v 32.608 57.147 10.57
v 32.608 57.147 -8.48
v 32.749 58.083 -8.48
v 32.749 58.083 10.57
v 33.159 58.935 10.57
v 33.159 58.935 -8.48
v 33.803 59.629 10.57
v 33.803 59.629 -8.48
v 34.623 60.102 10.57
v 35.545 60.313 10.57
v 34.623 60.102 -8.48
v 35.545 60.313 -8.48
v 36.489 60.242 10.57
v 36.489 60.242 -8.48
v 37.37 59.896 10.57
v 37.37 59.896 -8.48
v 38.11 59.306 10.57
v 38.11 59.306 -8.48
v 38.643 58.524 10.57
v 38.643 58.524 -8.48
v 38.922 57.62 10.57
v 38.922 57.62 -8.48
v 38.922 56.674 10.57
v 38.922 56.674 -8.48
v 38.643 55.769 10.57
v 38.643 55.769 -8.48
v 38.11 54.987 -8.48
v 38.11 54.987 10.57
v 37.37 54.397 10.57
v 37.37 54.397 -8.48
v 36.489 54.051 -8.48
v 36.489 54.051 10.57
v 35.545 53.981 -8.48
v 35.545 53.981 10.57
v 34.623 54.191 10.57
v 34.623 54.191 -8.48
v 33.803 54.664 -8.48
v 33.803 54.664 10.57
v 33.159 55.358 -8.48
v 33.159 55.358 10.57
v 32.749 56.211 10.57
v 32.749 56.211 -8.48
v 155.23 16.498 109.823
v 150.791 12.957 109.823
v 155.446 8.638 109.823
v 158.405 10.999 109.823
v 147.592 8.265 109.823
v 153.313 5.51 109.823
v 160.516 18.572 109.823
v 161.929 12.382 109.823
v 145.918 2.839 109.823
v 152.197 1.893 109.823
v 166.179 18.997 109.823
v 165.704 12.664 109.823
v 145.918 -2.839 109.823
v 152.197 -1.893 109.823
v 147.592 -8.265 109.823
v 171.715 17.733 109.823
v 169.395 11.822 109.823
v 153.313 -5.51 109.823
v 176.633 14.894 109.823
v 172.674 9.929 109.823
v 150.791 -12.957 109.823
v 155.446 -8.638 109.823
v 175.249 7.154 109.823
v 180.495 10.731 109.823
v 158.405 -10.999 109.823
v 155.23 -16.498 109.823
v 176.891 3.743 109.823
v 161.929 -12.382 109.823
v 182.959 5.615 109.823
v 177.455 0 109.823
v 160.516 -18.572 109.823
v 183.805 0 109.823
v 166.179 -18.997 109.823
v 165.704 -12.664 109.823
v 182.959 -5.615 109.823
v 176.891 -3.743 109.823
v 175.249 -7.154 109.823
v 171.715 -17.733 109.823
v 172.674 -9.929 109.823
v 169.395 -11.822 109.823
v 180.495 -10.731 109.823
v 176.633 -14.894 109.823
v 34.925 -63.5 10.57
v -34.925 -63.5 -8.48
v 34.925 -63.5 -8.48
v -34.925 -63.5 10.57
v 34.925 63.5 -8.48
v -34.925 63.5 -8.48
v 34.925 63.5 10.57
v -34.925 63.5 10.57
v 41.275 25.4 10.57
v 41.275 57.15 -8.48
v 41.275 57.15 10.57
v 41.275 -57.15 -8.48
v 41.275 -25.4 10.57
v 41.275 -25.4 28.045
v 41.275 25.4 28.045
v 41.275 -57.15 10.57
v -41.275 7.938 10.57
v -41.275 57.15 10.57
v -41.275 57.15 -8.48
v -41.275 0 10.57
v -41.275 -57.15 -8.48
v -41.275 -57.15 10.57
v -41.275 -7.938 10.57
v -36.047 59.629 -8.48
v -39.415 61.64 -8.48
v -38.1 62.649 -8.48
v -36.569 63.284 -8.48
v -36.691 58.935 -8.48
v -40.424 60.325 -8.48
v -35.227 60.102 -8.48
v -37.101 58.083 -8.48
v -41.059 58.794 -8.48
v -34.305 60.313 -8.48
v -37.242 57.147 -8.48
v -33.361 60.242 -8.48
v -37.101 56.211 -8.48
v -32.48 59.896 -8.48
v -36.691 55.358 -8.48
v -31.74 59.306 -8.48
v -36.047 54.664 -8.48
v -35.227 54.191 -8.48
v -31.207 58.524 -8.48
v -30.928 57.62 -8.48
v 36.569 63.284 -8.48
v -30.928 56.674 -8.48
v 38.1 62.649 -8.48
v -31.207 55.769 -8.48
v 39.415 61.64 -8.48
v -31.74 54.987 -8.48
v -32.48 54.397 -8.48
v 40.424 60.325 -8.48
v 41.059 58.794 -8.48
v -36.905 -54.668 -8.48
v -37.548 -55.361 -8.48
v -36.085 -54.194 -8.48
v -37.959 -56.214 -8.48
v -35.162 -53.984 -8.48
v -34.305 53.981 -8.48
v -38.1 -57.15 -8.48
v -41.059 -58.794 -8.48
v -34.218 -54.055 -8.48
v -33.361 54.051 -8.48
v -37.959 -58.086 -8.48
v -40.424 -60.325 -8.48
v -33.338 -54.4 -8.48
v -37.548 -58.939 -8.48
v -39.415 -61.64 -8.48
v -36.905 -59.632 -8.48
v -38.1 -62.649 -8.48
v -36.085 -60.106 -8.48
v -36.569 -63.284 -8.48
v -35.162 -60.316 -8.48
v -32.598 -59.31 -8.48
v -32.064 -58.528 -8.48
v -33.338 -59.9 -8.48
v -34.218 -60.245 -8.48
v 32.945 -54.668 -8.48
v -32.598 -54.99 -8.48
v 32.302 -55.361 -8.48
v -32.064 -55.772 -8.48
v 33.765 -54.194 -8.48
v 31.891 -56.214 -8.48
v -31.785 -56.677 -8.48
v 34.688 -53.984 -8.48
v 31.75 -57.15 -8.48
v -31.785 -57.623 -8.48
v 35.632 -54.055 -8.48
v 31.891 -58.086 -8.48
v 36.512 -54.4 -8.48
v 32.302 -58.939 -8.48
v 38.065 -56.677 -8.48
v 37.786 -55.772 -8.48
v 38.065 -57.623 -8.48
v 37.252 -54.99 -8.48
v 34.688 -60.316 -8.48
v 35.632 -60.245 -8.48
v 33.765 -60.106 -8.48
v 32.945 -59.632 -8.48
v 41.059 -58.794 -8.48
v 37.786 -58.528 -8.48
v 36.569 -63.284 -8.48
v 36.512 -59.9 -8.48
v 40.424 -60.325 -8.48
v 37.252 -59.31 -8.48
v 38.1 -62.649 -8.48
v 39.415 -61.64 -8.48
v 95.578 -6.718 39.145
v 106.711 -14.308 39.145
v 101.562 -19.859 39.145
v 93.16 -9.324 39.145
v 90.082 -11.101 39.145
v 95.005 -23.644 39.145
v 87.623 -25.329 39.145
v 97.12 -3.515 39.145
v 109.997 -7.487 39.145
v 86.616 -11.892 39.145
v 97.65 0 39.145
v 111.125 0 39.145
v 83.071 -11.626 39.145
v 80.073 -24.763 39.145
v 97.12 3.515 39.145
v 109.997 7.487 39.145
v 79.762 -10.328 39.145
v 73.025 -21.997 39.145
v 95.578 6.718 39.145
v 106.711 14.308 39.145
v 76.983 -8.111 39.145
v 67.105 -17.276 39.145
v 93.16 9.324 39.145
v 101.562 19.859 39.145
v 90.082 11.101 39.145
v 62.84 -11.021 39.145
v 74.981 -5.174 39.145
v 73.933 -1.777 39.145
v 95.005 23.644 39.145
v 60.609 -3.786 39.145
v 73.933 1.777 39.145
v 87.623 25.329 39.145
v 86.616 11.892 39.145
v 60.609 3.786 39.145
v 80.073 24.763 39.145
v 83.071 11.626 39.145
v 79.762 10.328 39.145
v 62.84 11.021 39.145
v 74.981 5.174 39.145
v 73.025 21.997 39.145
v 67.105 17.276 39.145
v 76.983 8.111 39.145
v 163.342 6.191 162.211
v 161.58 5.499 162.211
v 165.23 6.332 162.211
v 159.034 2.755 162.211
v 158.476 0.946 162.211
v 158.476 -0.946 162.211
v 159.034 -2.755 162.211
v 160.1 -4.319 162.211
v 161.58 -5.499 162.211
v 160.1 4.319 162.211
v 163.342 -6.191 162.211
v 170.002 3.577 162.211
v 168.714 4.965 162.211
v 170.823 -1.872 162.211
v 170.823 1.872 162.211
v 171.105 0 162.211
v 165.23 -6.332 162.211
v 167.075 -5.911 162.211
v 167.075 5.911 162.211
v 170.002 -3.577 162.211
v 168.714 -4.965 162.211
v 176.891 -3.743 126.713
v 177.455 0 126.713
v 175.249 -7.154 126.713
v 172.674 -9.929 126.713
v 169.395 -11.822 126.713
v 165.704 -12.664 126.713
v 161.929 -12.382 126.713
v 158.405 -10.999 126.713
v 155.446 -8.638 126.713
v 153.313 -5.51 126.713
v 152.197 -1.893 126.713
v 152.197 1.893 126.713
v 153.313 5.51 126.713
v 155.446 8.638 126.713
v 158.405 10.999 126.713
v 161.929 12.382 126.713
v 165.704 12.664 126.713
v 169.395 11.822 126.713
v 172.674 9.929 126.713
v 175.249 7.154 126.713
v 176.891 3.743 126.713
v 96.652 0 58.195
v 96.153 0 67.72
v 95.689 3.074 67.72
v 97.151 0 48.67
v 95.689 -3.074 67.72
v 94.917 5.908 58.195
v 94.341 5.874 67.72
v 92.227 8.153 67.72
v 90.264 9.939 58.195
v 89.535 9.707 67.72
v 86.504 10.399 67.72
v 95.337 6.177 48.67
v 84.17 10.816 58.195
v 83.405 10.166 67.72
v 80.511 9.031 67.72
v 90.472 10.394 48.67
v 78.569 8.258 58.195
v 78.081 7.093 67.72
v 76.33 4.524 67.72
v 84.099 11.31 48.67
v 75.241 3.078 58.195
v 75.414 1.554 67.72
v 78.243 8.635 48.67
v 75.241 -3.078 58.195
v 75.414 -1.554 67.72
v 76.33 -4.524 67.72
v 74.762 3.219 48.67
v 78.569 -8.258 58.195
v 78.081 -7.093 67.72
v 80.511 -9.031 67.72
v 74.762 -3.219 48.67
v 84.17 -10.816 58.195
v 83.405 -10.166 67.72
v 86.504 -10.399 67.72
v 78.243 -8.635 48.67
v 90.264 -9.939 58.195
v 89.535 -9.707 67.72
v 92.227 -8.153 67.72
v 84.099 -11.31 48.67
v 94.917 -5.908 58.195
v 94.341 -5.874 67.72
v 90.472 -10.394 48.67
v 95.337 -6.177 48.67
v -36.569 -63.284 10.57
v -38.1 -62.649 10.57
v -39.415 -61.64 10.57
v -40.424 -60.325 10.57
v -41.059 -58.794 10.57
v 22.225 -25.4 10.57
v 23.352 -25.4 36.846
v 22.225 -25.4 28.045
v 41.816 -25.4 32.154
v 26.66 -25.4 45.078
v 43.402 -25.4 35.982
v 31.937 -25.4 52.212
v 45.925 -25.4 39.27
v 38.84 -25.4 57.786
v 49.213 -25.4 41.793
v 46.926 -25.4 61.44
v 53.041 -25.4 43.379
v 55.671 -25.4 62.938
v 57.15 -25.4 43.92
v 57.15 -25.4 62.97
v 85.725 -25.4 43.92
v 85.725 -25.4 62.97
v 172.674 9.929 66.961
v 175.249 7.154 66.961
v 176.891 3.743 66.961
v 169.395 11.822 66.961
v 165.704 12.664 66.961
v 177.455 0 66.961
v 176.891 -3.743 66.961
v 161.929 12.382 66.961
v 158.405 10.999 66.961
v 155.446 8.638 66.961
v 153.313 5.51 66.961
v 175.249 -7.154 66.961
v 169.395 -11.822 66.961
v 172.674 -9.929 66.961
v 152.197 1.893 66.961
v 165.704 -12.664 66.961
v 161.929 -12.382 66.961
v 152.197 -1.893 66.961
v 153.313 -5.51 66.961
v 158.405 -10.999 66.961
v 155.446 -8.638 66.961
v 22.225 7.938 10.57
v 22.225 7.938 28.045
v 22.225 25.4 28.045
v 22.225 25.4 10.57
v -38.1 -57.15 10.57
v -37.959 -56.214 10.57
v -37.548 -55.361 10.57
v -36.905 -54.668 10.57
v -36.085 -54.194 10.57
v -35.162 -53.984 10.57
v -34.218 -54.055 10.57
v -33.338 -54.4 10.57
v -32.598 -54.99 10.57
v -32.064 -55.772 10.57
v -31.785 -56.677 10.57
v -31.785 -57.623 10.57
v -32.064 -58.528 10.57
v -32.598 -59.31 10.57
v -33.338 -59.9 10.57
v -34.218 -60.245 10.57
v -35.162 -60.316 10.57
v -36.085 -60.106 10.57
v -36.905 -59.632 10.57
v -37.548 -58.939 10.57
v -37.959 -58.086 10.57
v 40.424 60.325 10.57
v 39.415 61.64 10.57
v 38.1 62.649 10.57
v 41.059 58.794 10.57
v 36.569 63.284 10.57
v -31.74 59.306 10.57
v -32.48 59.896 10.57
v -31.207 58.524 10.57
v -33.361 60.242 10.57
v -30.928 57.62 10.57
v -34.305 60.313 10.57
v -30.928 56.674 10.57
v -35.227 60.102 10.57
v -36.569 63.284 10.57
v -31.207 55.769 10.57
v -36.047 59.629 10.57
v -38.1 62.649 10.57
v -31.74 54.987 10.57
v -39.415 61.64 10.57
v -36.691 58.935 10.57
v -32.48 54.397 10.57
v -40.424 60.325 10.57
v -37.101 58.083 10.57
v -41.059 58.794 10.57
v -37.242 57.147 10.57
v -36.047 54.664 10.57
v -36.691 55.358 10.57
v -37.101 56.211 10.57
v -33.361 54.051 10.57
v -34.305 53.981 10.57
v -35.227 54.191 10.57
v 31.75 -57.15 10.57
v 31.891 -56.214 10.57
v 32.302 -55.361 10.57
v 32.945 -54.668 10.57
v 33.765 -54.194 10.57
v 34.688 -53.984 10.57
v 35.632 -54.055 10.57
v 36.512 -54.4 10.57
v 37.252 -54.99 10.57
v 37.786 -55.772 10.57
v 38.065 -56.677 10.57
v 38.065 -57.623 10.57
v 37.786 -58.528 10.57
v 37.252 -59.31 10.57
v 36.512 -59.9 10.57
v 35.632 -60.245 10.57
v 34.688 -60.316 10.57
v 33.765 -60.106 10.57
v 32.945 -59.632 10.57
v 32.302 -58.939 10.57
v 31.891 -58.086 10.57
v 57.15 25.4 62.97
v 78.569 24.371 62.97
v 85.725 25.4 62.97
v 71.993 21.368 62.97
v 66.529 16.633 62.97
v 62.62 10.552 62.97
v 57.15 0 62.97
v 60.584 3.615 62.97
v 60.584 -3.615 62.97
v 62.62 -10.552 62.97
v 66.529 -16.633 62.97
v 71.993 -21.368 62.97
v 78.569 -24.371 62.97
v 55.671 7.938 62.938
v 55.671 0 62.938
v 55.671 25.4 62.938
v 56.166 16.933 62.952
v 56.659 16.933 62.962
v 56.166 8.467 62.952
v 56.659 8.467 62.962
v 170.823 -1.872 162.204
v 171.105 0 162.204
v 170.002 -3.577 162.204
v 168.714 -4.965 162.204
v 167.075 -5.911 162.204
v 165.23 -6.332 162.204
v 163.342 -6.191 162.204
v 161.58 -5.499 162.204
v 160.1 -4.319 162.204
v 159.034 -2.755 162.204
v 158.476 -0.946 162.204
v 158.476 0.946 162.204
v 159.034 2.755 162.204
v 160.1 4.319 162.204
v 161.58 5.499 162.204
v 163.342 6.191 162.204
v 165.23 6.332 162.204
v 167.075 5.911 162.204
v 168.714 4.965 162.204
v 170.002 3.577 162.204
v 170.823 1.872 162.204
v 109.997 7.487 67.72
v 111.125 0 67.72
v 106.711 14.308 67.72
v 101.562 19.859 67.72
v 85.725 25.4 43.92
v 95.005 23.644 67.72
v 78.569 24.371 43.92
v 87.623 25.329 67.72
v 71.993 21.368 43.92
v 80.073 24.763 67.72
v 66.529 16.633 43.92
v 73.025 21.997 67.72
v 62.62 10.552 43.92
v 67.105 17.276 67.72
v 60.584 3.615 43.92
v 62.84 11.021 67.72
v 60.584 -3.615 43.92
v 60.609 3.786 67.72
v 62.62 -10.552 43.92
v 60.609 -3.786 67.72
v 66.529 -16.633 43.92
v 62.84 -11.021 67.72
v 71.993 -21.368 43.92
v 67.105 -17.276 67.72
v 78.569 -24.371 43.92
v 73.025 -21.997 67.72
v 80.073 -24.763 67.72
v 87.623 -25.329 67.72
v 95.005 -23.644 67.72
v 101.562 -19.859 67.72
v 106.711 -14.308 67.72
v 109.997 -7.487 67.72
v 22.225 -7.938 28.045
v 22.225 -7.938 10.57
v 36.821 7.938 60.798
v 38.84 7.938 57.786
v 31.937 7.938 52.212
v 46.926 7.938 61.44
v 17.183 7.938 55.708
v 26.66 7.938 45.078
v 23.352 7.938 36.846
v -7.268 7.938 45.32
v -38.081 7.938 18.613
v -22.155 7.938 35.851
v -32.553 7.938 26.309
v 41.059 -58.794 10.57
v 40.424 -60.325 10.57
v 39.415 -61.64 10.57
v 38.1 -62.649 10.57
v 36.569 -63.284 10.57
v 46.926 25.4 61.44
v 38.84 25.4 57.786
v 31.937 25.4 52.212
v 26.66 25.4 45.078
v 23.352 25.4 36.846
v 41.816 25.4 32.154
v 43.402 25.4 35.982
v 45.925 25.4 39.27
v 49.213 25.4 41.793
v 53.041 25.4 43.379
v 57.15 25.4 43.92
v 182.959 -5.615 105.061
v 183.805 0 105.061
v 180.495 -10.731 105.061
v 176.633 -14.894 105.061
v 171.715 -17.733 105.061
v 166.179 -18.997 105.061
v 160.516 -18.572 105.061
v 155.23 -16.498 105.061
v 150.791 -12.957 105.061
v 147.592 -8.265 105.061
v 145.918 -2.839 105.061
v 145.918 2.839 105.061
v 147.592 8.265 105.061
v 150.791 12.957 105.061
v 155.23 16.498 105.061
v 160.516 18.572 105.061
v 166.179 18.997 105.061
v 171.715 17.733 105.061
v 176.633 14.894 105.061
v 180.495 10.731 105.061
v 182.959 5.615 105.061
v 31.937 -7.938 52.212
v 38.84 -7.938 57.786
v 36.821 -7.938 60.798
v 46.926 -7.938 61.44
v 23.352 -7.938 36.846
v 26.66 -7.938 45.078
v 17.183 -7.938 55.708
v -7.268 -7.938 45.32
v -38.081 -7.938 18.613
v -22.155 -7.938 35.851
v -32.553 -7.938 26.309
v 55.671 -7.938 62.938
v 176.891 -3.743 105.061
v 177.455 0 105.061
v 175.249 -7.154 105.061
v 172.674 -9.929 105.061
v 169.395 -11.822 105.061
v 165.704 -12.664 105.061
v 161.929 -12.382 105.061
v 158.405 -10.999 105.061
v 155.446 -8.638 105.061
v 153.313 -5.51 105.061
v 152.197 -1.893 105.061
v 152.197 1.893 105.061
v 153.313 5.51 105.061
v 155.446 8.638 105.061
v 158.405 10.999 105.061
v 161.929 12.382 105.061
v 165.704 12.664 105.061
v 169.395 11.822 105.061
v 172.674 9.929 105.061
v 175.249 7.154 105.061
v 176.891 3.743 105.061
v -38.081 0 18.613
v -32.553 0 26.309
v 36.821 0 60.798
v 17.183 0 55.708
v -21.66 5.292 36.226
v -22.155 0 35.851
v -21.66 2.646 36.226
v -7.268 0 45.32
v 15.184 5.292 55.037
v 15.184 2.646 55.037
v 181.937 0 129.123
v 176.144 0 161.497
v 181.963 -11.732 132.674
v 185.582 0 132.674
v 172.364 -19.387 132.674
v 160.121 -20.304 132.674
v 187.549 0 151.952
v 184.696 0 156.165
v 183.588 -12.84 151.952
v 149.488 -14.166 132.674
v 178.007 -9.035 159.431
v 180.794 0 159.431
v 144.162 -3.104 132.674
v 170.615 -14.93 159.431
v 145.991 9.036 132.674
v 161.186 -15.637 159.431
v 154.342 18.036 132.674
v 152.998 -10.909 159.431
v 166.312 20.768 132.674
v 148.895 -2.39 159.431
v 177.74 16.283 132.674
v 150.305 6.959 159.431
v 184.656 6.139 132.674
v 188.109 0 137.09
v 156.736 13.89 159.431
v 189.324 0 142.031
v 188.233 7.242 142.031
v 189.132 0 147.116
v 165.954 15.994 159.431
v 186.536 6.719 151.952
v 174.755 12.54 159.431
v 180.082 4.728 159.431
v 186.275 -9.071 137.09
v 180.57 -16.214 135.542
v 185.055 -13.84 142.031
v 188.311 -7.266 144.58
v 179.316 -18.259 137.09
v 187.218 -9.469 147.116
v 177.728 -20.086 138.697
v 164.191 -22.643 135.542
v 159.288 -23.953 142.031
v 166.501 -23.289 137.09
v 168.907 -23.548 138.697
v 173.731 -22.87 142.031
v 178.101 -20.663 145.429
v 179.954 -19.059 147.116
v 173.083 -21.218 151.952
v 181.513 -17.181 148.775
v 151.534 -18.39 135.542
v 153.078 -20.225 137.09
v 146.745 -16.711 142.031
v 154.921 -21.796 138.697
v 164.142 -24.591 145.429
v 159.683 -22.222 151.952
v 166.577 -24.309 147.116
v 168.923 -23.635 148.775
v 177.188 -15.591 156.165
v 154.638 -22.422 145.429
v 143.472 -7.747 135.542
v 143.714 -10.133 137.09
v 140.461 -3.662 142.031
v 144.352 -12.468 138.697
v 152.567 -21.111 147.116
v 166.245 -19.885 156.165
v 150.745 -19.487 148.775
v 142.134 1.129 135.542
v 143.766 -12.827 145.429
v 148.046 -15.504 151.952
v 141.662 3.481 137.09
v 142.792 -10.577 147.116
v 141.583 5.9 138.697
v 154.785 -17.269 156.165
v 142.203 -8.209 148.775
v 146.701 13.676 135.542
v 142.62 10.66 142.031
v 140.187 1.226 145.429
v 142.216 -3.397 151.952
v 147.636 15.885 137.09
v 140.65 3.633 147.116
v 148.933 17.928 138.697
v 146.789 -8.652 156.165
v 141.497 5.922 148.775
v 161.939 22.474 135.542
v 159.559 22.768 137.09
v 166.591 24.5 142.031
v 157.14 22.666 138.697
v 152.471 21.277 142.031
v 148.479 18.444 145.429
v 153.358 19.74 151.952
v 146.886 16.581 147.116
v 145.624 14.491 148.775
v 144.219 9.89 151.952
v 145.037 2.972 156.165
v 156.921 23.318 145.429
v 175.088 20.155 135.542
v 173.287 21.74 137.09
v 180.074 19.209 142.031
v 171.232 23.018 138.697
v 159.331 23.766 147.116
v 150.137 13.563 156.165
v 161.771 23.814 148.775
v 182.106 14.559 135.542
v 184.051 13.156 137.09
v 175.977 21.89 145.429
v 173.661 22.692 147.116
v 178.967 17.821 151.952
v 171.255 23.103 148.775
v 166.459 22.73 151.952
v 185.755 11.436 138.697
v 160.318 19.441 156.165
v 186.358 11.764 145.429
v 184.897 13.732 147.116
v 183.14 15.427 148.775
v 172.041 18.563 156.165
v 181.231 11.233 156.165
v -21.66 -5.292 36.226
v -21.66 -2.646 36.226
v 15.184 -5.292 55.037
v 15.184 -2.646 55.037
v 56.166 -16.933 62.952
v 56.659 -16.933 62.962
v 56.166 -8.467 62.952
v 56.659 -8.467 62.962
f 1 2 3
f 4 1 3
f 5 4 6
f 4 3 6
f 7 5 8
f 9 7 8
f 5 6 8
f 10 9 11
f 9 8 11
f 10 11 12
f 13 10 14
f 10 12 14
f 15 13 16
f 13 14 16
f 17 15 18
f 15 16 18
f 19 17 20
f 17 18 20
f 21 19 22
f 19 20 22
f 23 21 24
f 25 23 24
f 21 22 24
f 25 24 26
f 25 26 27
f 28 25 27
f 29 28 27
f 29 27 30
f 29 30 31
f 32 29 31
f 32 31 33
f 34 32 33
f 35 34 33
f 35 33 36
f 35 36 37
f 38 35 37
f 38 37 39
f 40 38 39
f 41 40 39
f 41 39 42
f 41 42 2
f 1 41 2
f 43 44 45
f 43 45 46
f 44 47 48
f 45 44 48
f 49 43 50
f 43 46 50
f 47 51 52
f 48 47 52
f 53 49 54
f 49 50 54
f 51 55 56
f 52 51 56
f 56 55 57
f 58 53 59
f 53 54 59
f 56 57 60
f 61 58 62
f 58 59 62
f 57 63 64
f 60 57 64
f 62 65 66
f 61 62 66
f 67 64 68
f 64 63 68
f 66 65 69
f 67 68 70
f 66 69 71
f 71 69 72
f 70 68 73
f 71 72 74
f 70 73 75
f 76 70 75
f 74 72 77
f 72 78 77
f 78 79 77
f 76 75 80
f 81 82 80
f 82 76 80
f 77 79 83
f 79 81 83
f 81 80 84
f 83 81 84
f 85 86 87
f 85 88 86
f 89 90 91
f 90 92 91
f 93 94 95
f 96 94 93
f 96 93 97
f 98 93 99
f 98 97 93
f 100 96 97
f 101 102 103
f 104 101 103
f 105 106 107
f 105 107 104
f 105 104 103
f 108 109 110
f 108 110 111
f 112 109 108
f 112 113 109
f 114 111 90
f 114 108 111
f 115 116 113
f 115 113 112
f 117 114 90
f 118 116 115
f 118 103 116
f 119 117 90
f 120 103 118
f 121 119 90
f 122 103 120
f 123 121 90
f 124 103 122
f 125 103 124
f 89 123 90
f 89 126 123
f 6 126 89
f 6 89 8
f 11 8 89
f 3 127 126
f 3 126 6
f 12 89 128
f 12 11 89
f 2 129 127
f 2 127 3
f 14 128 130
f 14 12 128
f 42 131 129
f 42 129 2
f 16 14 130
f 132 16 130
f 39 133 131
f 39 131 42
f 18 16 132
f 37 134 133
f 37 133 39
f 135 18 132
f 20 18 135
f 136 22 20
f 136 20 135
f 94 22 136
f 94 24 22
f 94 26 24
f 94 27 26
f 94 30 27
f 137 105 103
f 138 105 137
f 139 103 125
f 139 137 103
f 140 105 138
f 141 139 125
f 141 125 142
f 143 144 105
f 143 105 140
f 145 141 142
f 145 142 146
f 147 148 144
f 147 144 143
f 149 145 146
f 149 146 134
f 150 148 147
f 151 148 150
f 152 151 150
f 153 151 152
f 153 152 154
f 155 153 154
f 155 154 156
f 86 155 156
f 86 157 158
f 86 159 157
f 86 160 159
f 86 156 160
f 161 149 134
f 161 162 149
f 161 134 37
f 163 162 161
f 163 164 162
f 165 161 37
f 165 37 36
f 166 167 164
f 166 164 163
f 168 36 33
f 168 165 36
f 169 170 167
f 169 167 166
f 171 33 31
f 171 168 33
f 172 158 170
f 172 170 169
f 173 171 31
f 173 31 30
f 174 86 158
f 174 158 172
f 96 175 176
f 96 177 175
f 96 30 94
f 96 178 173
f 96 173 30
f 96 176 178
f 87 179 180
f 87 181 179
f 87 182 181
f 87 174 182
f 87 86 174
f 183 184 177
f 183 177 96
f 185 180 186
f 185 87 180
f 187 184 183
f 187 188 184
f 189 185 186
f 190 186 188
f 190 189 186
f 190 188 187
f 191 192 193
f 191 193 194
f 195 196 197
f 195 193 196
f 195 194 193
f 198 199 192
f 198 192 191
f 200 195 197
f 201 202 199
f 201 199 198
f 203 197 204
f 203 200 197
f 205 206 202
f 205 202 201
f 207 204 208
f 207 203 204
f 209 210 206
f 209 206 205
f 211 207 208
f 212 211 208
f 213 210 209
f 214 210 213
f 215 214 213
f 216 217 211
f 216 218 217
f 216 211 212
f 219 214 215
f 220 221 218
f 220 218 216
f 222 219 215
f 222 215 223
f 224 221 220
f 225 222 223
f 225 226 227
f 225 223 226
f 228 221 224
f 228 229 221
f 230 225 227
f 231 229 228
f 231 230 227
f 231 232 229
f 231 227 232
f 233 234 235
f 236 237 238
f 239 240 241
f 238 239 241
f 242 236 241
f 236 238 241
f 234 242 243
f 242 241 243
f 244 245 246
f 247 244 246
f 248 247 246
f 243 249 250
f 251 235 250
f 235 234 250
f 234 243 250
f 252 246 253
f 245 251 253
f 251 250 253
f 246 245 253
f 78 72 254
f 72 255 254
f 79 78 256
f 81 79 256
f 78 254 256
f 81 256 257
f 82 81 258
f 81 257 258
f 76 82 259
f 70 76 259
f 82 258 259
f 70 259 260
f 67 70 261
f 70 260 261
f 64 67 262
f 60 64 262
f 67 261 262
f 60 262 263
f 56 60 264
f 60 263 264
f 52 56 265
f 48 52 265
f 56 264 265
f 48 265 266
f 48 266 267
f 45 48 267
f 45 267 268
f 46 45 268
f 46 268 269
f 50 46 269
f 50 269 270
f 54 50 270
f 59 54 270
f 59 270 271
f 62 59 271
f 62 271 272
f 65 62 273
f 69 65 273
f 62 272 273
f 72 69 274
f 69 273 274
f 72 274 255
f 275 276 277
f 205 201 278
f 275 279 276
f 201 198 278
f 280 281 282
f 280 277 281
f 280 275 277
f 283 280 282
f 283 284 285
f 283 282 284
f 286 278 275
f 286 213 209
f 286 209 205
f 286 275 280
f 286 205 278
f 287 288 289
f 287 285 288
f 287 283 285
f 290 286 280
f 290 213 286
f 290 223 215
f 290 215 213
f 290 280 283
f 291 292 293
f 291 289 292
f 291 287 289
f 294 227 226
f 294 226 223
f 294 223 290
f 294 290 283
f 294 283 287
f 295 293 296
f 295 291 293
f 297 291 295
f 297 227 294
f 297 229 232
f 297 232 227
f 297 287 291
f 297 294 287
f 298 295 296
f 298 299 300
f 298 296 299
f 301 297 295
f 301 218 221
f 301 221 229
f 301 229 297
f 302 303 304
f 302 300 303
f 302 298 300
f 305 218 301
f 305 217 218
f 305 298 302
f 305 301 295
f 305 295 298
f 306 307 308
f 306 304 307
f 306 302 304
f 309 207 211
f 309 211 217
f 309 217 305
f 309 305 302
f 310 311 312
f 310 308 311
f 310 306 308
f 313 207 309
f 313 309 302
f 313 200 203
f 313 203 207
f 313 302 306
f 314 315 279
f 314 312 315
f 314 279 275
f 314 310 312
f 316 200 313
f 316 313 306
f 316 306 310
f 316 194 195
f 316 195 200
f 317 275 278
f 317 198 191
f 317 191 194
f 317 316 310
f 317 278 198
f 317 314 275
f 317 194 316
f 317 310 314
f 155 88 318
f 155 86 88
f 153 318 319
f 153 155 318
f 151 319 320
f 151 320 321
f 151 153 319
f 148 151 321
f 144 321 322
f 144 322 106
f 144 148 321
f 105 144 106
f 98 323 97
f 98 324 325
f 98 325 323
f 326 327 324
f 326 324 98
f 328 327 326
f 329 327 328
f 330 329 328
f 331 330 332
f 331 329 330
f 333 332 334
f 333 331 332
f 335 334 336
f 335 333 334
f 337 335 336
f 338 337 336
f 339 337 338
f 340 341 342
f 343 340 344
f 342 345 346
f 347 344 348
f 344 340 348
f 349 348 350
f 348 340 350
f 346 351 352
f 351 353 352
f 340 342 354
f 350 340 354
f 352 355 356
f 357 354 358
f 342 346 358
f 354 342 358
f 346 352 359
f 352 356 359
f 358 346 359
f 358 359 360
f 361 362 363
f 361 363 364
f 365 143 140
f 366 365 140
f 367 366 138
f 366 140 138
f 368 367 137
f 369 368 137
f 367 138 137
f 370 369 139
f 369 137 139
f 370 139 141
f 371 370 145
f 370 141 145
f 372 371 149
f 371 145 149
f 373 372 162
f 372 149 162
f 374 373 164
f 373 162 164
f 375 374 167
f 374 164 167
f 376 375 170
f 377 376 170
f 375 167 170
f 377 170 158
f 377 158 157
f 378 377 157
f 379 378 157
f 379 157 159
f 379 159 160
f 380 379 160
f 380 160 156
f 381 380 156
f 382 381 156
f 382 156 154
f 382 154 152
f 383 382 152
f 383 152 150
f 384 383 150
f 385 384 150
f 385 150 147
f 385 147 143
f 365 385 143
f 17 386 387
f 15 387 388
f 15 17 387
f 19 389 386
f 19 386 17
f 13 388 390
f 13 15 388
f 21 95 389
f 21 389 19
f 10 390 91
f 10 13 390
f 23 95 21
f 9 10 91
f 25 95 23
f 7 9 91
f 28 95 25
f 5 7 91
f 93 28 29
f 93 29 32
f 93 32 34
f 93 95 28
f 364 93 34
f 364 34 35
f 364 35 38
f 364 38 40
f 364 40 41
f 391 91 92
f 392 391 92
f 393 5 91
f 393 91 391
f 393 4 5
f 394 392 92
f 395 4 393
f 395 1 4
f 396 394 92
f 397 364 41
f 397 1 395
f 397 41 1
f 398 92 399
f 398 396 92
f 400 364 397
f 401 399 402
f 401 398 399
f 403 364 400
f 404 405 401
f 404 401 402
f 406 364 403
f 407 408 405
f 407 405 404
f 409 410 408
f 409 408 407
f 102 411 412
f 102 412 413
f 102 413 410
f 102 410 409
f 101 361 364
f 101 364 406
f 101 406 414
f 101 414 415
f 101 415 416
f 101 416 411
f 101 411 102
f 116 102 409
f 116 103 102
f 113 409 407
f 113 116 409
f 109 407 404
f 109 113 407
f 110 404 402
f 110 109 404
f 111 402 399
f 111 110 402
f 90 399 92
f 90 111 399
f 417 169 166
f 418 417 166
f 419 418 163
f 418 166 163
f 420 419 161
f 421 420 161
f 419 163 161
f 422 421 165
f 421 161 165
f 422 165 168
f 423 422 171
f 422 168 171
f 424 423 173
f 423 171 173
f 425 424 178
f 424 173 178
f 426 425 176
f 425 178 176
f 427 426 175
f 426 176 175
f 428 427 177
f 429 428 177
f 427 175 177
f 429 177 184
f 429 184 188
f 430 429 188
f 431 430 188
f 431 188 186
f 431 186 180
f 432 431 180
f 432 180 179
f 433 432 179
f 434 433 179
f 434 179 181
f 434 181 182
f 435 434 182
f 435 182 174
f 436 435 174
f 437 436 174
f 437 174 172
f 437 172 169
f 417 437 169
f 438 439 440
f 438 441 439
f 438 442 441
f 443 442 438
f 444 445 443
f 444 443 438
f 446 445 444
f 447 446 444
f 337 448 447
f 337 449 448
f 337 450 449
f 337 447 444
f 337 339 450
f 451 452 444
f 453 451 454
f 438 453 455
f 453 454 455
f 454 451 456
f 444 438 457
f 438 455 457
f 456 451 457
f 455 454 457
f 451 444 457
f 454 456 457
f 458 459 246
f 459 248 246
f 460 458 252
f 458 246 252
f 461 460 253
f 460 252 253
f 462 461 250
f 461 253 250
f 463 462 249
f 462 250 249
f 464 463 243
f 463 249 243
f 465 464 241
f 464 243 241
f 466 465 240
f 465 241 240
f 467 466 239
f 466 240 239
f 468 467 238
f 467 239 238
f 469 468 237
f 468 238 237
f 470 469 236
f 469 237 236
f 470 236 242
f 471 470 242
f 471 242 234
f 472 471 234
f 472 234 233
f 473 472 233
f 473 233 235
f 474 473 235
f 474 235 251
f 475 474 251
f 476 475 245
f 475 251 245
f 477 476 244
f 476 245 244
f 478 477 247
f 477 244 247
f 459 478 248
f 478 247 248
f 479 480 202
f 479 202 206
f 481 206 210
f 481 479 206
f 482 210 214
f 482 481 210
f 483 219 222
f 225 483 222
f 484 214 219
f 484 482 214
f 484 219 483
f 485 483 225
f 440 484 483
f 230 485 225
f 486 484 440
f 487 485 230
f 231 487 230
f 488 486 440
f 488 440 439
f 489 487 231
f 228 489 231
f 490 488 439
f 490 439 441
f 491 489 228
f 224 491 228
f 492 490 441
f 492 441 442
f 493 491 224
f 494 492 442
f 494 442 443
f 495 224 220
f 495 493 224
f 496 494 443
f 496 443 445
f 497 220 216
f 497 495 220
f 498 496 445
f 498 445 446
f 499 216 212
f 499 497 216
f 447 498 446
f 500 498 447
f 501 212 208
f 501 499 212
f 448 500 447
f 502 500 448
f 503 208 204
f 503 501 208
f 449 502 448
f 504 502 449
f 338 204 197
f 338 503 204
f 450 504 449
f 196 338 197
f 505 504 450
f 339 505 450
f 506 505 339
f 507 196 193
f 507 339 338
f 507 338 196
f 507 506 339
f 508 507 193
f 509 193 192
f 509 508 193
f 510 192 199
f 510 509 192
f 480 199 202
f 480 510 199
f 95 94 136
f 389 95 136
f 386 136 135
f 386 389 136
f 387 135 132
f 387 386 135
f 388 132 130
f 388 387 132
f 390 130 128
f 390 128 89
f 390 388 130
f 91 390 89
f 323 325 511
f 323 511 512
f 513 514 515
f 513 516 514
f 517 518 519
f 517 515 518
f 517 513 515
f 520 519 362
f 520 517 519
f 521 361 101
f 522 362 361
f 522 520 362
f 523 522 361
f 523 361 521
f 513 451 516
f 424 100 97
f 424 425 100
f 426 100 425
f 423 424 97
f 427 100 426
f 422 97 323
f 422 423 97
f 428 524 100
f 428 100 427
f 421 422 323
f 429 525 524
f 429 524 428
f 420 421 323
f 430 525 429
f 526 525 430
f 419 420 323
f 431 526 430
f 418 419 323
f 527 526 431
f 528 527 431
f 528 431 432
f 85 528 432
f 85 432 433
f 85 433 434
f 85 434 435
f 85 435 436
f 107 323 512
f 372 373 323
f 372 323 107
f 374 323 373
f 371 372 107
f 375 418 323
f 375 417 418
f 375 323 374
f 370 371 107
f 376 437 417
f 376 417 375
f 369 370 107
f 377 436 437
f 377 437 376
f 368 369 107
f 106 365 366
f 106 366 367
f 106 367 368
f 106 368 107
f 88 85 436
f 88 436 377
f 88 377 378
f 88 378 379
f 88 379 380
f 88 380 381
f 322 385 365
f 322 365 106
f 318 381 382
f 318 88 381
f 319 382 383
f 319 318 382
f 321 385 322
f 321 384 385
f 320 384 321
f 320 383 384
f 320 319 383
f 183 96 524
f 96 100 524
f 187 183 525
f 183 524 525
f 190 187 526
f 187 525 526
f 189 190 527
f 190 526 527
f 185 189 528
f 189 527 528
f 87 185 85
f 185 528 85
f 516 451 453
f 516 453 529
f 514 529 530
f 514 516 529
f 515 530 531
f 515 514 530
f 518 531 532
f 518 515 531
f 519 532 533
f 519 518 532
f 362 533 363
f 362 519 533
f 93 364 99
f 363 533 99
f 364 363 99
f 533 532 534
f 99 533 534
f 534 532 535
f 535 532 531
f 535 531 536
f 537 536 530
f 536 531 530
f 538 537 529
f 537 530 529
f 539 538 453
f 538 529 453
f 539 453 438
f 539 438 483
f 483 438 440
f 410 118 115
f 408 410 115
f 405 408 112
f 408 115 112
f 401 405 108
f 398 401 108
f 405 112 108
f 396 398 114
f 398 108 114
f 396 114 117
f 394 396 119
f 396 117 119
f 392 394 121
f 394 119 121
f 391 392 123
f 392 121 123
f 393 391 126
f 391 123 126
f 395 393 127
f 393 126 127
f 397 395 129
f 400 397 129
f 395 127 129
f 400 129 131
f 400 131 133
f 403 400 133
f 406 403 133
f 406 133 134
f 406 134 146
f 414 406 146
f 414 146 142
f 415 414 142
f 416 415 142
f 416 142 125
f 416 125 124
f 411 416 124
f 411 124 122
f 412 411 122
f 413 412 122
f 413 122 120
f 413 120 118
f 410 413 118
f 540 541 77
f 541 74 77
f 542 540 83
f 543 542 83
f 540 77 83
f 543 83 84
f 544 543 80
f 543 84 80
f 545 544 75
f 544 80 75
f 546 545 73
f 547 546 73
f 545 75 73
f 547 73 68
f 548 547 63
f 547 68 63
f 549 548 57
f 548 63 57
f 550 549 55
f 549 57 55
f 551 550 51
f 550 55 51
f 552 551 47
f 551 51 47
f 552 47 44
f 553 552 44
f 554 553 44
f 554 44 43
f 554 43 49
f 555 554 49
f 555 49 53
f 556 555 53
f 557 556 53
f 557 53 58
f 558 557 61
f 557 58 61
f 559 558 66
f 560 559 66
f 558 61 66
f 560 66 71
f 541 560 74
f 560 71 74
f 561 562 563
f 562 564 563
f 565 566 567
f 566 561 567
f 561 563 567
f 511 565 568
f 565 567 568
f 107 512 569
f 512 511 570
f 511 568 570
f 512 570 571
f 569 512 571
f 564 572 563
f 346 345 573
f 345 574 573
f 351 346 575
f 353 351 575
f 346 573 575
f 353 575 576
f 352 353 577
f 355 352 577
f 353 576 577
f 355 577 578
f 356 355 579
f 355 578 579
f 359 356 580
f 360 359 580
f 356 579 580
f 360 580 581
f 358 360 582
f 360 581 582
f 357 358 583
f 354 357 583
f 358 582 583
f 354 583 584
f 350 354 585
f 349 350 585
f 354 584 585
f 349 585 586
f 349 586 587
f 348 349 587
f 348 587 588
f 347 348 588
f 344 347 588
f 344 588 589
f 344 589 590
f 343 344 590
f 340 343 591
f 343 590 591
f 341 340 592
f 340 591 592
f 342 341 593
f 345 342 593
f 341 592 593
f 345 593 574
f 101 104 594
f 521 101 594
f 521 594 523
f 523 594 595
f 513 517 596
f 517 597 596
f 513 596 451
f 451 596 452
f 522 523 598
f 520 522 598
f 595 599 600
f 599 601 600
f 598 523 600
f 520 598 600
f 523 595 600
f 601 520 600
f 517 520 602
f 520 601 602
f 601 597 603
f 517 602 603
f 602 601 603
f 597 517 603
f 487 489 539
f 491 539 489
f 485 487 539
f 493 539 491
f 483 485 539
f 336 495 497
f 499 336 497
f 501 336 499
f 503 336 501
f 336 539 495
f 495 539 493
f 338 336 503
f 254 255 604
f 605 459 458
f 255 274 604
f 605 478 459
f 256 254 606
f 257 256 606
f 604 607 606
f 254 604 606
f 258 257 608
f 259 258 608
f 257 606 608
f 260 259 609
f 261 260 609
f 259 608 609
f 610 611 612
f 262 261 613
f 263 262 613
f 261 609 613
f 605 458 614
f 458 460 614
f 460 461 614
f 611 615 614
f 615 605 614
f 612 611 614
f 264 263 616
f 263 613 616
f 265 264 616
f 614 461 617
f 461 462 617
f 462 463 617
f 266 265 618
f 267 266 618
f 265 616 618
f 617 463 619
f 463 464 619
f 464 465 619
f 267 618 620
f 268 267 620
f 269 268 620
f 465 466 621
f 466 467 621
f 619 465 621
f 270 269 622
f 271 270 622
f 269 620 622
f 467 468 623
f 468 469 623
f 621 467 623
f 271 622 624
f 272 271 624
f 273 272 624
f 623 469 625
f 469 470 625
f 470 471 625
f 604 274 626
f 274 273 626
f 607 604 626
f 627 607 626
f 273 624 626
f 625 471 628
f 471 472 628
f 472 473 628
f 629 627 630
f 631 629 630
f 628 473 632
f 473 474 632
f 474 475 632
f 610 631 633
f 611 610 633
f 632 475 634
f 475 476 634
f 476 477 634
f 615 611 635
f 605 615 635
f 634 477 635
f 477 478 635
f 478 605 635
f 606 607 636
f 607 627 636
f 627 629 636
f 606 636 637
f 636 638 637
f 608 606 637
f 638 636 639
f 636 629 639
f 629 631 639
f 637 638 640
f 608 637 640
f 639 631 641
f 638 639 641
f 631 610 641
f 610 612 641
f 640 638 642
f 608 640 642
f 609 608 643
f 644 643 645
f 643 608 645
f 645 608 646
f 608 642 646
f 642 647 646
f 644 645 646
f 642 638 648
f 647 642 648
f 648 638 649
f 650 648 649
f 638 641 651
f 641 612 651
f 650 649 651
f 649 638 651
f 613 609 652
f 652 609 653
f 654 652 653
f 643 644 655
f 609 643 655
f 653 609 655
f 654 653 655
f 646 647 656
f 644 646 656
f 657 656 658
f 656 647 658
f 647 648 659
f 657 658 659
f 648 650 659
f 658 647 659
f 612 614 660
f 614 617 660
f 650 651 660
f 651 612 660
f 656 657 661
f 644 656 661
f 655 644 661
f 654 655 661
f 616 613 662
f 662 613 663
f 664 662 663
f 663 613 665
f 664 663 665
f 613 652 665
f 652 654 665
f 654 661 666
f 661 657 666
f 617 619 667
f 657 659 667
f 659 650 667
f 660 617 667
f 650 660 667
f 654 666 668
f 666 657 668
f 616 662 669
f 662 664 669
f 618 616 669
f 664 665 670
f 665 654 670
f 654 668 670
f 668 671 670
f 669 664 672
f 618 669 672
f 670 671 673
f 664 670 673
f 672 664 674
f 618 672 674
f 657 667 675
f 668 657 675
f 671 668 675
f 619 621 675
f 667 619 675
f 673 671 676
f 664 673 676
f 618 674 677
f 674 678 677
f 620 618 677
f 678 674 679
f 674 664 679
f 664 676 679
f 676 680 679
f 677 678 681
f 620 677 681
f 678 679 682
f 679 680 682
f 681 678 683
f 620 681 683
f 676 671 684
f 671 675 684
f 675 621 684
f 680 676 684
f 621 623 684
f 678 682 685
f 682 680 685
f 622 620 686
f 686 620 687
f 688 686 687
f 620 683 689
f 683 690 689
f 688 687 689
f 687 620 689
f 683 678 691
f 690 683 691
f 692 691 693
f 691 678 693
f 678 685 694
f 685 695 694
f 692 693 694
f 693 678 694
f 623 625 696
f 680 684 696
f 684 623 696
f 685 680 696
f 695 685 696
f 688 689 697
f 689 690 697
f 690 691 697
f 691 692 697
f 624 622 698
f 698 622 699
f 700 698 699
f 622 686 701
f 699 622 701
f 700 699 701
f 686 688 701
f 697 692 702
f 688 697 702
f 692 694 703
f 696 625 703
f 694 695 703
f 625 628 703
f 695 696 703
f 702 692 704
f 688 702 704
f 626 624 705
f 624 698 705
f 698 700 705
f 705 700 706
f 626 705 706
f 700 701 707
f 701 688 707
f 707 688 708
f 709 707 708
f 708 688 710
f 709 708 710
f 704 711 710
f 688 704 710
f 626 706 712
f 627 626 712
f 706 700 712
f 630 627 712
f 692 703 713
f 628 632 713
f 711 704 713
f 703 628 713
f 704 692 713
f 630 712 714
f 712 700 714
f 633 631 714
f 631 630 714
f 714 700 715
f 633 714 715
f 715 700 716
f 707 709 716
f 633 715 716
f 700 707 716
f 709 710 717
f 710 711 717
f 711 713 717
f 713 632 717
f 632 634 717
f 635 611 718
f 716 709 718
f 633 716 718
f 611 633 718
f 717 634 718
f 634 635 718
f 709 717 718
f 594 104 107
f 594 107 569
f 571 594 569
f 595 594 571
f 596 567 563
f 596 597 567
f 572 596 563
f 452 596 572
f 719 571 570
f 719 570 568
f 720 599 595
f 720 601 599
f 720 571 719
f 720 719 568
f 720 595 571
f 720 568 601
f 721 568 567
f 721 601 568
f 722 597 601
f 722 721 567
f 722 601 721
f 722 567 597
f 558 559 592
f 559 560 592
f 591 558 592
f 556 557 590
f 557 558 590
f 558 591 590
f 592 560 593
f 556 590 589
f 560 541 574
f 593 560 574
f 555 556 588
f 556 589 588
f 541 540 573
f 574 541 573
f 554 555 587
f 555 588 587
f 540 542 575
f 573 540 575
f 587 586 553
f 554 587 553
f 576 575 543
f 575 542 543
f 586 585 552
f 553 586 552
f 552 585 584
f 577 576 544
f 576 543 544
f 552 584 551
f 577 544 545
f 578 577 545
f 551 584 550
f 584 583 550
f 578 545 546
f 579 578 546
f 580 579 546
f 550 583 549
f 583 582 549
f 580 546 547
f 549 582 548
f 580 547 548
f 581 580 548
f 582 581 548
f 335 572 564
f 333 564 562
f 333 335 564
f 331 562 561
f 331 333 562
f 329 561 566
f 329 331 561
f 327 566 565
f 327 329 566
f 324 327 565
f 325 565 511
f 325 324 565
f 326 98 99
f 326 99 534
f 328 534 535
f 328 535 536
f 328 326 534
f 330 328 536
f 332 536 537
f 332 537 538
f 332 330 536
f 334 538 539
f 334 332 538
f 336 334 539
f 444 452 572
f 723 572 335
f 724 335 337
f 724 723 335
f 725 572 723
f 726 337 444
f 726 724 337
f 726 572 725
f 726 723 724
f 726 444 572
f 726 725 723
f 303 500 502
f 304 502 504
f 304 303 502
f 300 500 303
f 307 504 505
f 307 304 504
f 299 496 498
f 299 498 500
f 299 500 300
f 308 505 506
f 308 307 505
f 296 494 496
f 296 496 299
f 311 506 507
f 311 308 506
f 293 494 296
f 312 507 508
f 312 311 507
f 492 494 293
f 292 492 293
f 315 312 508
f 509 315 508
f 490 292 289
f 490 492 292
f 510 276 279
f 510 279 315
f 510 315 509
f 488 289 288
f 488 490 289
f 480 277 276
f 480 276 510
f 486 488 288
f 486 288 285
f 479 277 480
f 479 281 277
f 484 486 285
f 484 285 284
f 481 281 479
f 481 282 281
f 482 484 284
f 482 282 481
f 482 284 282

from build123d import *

# Parameters (mm, degrees)
F1_DEPTH = 63.5
F0_W     = 25.4
F0_H     = 19.05
F2_DEPTH = 25.4
F3_DEPTH = 7.9375
F5_R     = 6.35
F6_R     = 10.4277026359
F7_DEPTH = 76.201
F7_TAPER = -3
F9_D     = 6.35


with BuildPart() as f1:
    # F0 (on Front) → F1 (new body, symmetric)
    with BuildSketch(Plane.XZ):
        Polygon((-41.275, -8.4803864146), (41.275, -8.4803864146), (41.275, 10.5696135854), (22.225, 10.5696135854), (-41.275, 10.5696135854), align=None)
    extrude(amount=F1_DEPTH, both=True)

    # F0 (on Front) → F2 (join, symmetric)
    with BuildSketch(Plane.XZ):
        with BuildLine():
            Line((22.225, 10.5696135854), (41.275, 10.5696135854))
            Line((41.275, 10.5696135854), (41.275, 28.0448135854))
            ThreePointArc((41.275, 28.0448135854), (45.9246798487, 39.2701337367), (57.15, 43.9198135854))
            Line((57.15, 43.9198135854), (60.325, 43.9198135854))
            Line((60.325, 43.9198135854), (60.325, 62.9698135854))
            Line((60.325, 62.9698135854), (57.15, 62.9698135854))
            add(Edge.make_bspline(
                [(55.670826569, 62.9384759177), (56.1664980149, 62.9528020829), (56.6596018531, 62.963261742), (57.15, 62.9698135854)],
                knots=[110.0605103046, 110.0605103046, 110.0605103046, 110.0605103046, 111.5045361635, 111.5045361635, 111.5045361635, 111.5045361635], degree=3))
            ThreePointArc((55.670826569, 62.9384759177), (31.936751924, 52.2118933937), (22.225, 28.0448135854))
            Line((22.225, 28.0448135854), (22.225, 10.5696135854))
        make_face()
        with Locations((73.025, 53.4448135854)):
            Rectangle(F0_W, F0_H)
    extrude(amount=F2_DEPTH, both=True)

    # F0 (on Front) → F3 (join, symmetric)
    with BuildSketch(Plane.XZ):
        with BuildLine():
            add(Edge.make_bspline(
                [(-41.275, 10.5696135854), (-34.8028083987, 38.2935172536), (17.8918270147, 61.8465667659), (55.670826569, 62.9384759177)],
                knots=[0, 0, 0, 0, 110.0605103046, 110.0605103046, 110.0605103046, 110.0605103046], degree=3))
            Line((-41.275, 10.5696135854), (22.225, 10.5696135854))
            Line((22.225, 10.5696135854), (22.225, 28.0448135854))
            ThreePointArc((22.225, 28.0448135854), (31.936751924, 52.2118933937), (55.670826569, 62.9384759177))
        make_face()
    extrude(amount=F3_DEPTH, both=True)

    # F0 (on Front) → F4 (revolve)
    with BuildSketch(Plane.XZ):
        Polygon((85.725, 62.9698135854), (85.725, 43.9198135854), (85.725, 39.1446135854), (111.125, 39.1446135854), (111.125, 67.7196135854), (85.725, 67.7196135854), align=None)
    revolve(axis=Axis((85.725, 0, 53.4321135854), (0, 0, 1)))

    # F5
    f5_edges = [f1.edges().sort_by_distance(p)[0] for p in [
        (-41.275, -63.5, 1.044614),
        (41.275, -63.5, 1.044614),
        (41.275, 63.5, 1.044614),
        (-41.275, 63.5, 1.044614),
    ]]
    fillet(f5_edges, radius=F5_R)

    # F6 (on face) → F7 (cut, through all)
    with BuildSketch(Plane.XY.offset(67.7196135854)):
        with Locations((85.725, 0)):
            Circle(F6_R)
    extrude(amount=-F7_DEPTH, taper=F7_TAPER, mode=Mode.SUBTRACT)

    # F9 (through all)
    with Locations(Plane.XY.offset(10.5696135854)):
        with Locations((34.9249977589, -57.15), (-34.925, -57.15), (35.7827192911, 57.146779417), (-34.0672784677, 57.146779417)):
            Hole(F9_D / 2)


with BuildPart() as f11:
    # F10 (on Front) → F11 (revolve)
    with BuildSketch(Plane.XZ):
        with BuildLine():
            Line((164.7552926287, 162.2107950438), (164.7552926287, 66.9607950438))
            Line((164.7552926287, 66.9607950438), (177.4552926287, 66.9607950438))
            Line((177.4552926287, 66.9607950438), (177.4552926287, 105.0607950438))
            Line((177.4552926287, 105.0607950438), (183.8052926287, 105.0607950438))
            Line((183.8052926287, 105.0607950438), (183.8052926287, 109.8232950438))
            Line((183.8052926287, 109.8232950438), (177.4552926287, 109.8232950438))
            Line((177.4552926287, 109.8232950438), (177.4552926287, 126.7131795641))
            ThreePointArc((177.4552926287, 126.7131795641), (189.1324190967, 147.1158549306), (171.1052926287, 162.2038354438))
            Line((171.1052926287, 162.2038354438), (171.1052926287, 162.2107950438))
            Line((171.1052926287, 162.2107950438), (164.7552926287, 162.2107950438))
        make_face()
    revolve(axis=Axis((164.7552926287, 0, 114.5857950438), (0, 0, -1)))


solid = Compound([f1.part, f11.part])
